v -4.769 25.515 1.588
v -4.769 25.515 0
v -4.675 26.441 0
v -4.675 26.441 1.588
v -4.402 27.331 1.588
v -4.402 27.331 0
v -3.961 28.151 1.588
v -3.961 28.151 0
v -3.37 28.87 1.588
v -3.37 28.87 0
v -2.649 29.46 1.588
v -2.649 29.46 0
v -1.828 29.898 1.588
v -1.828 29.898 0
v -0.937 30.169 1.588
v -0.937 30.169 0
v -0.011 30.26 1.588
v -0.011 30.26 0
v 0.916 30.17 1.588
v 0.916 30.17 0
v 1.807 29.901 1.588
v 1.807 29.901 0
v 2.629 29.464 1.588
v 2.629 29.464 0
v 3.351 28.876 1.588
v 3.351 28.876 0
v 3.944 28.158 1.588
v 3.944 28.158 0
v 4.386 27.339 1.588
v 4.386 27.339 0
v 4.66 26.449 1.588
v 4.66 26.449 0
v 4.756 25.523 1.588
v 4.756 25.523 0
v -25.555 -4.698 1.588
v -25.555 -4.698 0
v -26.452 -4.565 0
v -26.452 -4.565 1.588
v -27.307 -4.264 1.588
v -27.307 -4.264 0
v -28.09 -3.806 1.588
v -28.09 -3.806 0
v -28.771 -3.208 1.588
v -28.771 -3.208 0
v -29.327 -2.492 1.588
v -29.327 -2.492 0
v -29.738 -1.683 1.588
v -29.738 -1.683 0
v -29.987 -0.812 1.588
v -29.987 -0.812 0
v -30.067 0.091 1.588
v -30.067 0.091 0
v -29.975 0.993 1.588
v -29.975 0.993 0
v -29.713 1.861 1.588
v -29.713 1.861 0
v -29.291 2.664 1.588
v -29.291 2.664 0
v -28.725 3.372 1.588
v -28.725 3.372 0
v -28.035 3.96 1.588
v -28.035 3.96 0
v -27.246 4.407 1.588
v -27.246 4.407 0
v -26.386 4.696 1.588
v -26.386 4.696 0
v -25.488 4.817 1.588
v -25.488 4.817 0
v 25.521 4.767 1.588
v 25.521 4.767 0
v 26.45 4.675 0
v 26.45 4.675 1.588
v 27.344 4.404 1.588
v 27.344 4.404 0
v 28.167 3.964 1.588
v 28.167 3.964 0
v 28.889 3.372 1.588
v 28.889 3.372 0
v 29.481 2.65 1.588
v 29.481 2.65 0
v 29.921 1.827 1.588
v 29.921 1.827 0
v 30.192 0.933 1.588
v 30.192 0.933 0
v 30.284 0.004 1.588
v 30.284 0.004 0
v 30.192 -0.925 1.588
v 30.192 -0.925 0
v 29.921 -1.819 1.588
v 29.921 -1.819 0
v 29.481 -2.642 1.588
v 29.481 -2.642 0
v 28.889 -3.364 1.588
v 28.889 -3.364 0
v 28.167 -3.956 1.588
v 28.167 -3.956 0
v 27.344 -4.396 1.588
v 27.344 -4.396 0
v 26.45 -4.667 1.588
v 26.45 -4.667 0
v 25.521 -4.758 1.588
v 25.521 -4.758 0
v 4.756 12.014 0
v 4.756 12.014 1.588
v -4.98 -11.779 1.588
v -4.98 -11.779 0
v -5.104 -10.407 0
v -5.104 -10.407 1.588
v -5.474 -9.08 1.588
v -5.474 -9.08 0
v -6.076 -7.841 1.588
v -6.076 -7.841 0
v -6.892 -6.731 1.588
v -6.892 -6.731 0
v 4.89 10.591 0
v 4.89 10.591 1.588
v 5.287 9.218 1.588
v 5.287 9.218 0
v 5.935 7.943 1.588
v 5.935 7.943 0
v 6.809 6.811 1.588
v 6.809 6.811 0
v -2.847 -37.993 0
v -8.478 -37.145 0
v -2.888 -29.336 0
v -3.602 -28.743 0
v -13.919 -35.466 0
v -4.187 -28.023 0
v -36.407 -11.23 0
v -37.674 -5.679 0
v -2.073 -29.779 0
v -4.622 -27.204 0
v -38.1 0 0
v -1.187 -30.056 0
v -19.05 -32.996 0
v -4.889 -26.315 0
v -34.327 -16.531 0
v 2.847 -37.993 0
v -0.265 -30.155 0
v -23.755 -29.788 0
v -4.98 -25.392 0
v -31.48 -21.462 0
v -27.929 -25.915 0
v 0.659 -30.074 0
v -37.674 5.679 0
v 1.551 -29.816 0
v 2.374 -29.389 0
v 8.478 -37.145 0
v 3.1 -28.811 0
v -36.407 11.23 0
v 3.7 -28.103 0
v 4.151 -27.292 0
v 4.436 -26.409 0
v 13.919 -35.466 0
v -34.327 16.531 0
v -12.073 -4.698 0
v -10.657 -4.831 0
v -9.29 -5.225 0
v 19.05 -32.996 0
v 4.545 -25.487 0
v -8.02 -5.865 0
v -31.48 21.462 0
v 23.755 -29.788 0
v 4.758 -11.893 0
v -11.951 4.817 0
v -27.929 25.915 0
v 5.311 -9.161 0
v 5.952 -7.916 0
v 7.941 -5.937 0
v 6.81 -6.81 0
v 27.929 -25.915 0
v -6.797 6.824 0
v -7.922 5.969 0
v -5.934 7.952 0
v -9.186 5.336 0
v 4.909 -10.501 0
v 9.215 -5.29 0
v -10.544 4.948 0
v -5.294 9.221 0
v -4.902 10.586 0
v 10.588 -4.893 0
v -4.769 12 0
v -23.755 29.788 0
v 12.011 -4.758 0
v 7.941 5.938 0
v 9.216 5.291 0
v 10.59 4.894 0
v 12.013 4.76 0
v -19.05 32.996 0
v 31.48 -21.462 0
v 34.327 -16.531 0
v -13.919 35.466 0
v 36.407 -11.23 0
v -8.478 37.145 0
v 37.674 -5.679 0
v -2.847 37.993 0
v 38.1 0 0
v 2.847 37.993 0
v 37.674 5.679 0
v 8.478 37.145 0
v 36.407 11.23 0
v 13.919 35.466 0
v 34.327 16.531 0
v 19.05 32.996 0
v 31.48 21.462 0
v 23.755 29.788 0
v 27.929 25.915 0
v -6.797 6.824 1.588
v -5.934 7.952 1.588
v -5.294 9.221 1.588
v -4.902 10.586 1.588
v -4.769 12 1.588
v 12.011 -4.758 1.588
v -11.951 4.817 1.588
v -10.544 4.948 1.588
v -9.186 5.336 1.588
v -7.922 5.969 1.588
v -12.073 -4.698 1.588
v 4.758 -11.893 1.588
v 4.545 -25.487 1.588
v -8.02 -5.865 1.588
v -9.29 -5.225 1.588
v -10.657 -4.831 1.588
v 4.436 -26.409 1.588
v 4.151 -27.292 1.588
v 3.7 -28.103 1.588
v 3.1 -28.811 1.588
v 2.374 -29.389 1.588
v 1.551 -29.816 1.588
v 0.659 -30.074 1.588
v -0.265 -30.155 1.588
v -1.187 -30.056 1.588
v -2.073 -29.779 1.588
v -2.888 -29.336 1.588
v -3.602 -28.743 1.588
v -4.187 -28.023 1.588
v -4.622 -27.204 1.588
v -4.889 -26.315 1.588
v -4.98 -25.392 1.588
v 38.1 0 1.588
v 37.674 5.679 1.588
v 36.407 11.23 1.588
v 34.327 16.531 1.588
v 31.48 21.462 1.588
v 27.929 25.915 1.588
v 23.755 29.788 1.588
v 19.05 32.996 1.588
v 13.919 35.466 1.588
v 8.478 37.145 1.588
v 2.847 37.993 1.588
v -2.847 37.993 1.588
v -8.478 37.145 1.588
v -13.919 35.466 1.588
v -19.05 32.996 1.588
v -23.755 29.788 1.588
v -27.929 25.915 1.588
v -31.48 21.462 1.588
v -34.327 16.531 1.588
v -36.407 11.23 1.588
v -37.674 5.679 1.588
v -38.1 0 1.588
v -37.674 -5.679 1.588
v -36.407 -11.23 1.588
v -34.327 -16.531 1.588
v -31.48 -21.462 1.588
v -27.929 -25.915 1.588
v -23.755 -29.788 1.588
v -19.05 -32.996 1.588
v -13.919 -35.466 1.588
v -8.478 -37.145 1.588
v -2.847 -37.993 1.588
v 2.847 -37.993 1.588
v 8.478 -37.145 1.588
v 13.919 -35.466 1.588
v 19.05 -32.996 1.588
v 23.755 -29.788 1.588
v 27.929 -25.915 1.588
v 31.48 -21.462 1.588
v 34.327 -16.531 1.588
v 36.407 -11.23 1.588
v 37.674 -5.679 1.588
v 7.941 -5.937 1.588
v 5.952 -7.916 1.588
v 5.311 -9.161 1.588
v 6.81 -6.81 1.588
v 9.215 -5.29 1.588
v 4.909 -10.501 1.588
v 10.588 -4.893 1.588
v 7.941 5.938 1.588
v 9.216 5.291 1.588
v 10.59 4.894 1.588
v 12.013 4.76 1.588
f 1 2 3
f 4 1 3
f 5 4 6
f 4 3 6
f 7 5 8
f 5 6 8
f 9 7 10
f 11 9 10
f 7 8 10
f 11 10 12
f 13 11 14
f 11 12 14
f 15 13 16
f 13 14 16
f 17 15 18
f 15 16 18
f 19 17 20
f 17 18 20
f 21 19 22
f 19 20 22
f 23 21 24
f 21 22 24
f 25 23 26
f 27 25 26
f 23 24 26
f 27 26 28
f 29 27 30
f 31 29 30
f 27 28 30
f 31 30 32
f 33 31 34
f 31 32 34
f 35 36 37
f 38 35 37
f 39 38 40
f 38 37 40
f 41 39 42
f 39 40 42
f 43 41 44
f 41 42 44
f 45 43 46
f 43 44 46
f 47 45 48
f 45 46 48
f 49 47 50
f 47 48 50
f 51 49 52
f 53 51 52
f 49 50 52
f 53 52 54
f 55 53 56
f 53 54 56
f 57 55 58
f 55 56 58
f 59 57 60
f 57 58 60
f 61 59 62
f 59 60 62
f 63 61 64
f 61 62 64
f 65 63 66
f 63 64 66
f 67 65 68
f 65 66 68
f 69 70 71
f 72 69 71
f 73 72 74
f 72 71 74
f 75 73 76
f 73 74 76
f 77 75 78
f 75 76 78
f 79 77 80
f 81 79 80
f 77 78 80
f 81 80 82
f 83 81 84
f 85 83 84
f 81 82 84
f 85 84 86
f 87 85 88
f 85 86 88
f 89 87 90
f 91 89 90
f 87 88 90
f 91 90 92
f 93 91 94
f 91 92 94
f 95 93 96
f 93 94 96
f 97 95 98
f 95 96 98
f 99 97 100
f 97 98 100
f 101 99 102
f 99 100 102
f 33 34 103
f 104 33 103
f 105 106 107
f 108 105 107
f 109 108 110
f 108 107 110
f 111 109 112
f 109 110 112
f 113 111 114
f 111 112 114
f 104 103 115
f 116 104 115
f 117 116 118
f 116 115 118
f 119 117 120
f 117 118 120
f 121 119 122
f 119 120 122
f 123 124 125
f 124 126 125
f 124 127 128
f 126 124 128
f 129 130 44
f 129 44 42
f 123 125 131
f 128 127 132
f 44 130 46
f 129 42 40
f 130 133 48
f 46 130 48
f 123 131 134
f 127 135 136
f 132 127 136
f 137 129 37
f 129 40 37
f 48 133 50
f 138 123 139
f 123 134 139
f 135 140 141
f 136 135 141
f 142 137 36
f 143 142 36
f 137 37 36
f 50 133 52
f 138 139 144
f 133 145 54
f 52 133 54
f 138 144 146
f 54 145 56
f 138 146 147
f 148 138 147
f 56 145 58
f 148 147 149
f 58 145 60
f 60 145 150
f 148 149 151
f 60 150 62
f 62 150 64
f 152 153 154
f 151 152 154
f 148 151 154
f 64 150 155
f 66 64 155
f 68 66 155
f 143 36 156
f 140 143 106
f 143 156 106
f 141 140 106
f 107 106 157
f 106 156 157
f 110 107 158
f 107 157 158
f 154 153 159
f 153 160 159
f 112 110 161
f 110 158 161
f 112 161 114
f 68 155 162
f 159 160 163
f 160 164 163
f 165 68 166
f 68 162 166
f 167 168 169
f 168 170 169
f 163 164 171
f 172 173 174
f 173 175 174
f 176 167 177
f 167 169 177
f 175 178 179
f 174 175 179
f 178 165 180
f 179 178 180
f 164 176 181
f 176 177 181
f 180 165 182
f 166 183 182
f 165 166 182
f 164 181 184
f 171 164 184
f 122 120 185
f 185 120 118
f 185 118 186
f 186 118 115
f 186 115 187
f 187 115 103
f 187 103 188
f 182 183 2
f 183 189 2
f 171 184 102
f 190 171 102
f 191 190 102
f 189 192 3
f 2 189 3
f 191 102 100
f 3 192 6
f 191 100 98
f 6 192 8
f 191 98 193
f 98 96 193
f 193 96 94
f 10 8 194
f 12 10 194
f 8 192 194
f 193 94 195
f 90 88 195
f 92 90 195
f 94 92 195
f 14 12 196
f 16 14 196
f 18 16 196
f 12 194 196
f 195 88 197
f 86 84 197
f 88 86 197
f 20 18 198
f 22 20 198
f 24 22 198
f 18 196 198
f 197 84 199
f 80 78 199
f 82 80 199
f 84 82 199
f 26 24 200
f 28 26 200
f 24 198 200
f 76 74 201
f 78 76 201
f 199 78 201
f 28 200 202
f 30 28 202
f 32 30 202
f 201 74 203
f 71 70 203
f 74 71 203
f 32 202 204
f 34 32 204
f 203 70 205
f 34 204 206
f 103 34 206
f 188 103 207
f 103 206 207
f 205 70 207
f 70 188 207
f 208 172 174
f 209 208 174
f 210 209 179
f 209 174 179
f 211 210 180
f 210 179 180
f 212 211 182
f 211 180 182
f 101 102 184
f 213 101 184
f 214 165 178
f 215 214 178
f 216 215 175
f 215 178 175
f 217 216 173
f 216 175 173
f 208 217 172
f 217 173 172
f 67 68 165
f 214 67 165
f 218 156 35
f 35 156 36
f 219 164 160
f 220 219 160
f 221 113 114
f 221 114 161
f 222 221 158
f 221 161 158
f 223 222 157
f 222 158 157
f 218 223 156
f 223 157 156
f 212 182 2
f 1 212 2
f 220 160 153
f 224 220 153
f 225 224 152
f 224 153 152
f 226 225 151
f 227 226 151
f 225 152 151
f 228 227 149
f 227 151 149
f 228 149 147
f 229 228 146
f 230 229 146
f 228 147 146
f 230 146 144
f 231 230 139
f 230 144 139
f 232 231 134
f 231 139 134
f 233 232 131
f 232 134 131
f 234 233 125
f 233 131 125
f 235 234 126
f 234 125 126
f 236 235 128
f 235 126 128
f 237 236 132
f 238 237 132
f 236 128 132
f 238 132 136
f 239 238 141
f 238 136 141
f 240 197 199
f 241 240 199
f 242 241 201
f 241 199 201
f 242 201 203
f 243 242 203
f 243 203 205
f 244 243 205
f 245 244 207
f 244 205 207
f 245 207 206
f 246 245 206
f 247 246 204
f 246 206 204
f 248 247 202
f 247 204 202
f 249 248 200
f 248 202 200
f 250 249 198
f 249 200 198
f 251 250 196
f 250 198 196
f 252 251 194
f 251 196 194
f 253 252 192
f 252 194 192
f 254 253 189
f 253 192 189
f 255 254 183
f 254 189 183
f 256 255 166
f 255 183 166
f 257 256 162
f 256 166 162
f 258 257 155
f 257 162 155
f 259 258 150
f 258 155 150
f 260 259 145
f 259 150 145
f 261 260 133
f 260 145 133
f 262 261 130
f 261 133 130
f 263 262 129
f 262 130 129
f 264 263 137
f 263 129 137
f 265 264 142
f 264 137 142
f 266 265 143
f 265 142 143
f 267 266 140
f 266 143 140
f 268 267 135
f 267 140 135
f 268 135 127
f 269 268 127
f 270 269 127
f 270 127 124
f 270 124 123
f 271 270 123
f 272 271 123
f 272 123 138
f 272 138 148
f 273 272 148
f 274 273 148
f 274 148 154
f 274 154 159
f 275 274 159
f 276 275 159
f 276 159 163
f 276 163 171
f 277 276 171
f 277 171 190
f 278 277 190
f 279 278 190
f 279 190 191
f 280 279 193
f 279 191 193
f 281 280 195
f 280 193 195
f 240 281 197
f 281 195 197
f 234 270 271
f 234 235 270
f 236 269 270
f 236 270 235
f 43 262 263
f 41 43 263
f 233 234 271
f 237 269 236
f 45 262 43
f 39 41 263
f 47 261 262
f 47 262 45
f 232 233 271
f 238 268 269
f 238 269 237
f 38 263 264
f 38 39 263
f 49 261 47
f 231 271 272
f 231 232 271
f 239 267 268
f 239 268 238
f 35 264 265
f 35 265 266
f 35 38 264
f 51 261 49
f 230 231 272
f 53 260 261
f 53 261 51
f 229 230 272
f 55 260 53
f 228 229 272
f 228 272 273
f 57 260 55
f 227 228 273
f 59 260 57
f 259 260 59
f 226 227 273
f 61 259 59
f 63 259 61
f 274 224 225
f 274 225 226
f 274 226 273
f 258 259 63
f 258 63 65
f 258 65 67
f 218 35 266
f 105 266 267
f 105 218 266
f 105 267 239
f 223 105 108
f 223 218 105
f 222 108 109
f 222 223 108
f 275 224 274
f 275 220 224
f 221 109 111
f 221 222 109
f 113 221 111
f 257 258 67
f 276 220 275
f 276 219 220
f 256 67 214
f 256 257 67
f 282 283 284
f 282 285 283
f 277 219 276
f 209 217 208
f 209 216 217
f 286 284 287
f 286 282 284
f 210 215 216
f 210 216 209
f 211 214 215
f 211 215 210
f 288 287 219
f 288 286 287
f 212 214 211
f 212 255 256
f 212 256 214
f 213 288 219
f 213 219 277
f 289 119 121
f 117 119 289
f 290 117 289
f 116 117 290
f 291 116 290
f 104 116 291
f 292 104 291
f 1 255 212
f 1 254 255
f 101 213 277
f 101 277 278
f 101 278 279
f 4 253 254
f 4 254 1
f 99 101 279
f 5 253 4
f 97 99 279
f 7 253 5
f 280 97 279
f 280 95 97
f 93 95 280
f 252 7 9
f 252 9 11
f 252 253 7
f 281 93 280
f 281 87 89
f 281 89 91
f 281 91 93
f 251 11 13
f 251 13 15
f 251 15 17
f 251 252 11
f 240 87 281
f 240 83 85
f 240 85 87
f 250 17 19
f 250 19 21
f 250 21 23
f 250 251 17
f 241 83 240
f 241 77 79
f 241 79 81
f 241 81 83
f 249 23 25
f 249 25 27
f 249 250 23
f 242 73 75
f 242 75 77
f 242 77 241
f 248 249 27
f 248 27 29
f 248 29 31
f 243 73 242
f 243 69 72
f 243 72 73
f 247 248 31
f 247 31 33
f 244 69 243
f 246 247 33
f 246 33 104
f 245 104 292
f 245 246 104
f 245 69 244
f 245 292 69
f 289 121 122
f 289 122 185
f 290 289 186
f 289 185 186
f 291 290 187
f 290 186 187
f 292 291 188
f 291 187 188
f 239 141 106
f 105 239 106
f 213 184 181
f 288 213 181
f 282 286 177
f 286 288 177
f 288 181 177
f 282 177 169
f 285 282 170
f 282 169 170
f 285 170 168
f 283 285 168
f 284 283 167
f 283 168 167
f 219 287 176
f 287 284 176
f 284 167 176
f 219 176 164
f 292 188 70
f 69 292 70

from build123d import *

# Parameters (mm, degrees)
F0_R         = 38.1
F1_DEPTH     = 1.5875
F2_T1_DEPTH  = 19.6594045054
F2_T3_DEPTH  = 19.7689044348
F2_T5_DEPTH  = 19.8002867112
F2_T7_DEPTH  = 19.8028708993
F2_T9_DEPTH  = 19.7937834769
F2_T11_DEPTH = 19.3627357335
F2_T13_DEPTH = 19.2813787557
F2_T15_DEPTH = 19.9326468644


# Not quite as in the source:
# - a fillet or chamfer that OpenCascade refuses, or shapes differently, is made with other operations: its cross-section is extruded or revolved along the edge and cut away or added


with BuildPart() as f1:
    # F0 (on Top) → F1 (new body)
    with BuildSketch(Plane.XY):
        Circle(F0_R)
        with BuildLine():
            ThreePointArc((25.5212023113, 4.7665246553), (30.2837023113, 0.0040246553), (25.5212023113, -4.7584753447))
            Line((25.5212023113, -4.7584753447), (8.3700942824, -4.7584753447))
            ThreePointArc((8.3700942824, -4.7584753447), (6.8307613912, -6.7854450641), (4.8140826203, -8.3382356902))
            Line((4.8140826203, -8.3382356902), (4.5445678914, -25.4872259938))
            ThreePointArc((4.5445678914, -25.4872259938), (-0.2648058004, -30.1554173191), (-4.9795027497, -25.3916248979))
            Line((-4.9795027497, -25.3916248979), (-4.9795027497, -8.2405168689))
            ThreePointArc((-4.9795027497, -8.2405168689), (-6.9221674375, -6.692171835), (-8.4040103572, -4.6983162748))
            Line((-8.4040103572, -4.6983162748), (-25.5551183861, -4.6983162748))
            ThreePointArc((-25.5551183861, -4.6983162748), (-30.0672979191, 0.0912532901), (-25.4878952685, 4.8165905393))
            Line((-25.4878952685, 4.8165905393), (-8.3367872396, 4.8165905393))
            ThreePointArc((-8.3367872396, 4.8165905393), (-6.7888119889, 6.8274151536), (-4.7692424862, 8.3639638934))
            Line((-4.7692424862, 8.3639638934), (-4.7692424862, 25.5150719223))
            ThreePointArc((-4.7692424862, 25.5150719223), (-0.0106390137, 30.260270074), (4.7556603142, 25.5228020557))
            Line((4.7556603142, 25.5228020557), (4.7556603142, 8.3716940268))
            ThreePointArc((4.7556603142, 8.3716940268), (6.8069974407, 6.8092842314), (8.3700961728, 4.7584720195))
            Line((8.3700961728, 4.7584720195), (25.5212023113, 4.7665246553))
        make_face(mode=Mode.SUBTRACT)
    extrude(amount=F1_DEPTH)

    # F2: fillet of radius 7.62 on 8 edges, made by hand

    # F2_s2 → F2_t1 (cut)
    with BuildSketch(Plane.XY.offset(-9.0359522527)):
        with BuildLine():
            ThreePointArc((-11.9511681406, 4.8165905393), (-9.1053172731, 5.3679603439), (-6.6713079375, 6.9422774581))
            ThreePointArc((-6.6713079375, 6.9422774581), (-7.5789423028, 5.9381141343), (-8.3367872396, 4.8165905393))
            Line((-8.3367872396, 4.8165905393), (-11.9511681406, 4.8165905393))
        make_face()
    extrude(amount=F2_T1_DEPTH, mode=Mode.SUBTRACT)

    # F2_s4 → F2_t3 (cut)
    with BuildSketch(Plane.XY.offset(-9.0907022174)):
        with BuildLine():
            ThreePointArc((-6.9158471176, 6.6987031989), (-5.3262518764, 9.1404259669), (-4.7692424862, 12.0002447803))
            Line((-4.7692424862, 12.0002447803), (-4.7692424862, 8.3639638934))
            ThreePointArc((-4.7692424862, 8.3639638934), (-5.9015763197, 7.607428136), (-6.9158471176, 6.6987031989))
        make_face()
    extrude(amount=F2_T3_DEPTH, mode=Mode.SUBTRACT)

    # F2_s6 → F2_t5 (cut)
    with BuildSketch(Plane.XY.offset(-9.1063933556)):
        with BuildLine():
            ThreePointArc((4.7556603142, 12.014251369), (5.3142882964, 9.1504383117), (6.9082653607, 6.7065218711))
            ThreePointArc((6.9082653607, 6.7065218711), (5.8910941356, 7.615548292), (4.7556603142, 8.3716940268))
            Line((4.7556603142, 8.3716940268), (4.7556603142, 12.014251369))
        make_face()
    extrude(amount=F2_T5_DEPTH, mode=Mode.SUBTRACT)

    # F2_s8 → F2_t7 (cut)
    with BuildSketch(Plane.XY.offset(-9.1076854497)):
        with BuildLine():
            ThreePointArc((6.703921101, 6.9107892294), (9.1487661341, 5.3175989867), (12.0131699511, 4.7601824833))
            Line((12.0131699511, 4.7601824833), (8.3700961728, 4.7584720195))
            ThreePointArc((8.3700961728, 4.7584720195), (7.6134497132, 5.893806017), (6.703921101, 6.9107892294))
        make_face()
    extrude(amount=F2_T7_DEPTH, mode=Mode.SUBTRACT)

    # F2_s10 → F2_t9 (cut)
    with BuildSketch(Plane.XY.offset(-9.1031417385)):
        with BuildLine():
            ThreePointArc((12.0113509777, -4.7584753447), (9.1483653066, -5.3167678283), (6.7049028325, -6.9098367498))
            ThreePointArc((6.7049028325, -6.9098367498), (7.6138671828, -5.8932667023), (8.3700942824, -4.7584753447))
            Line((8.3700942824, -4.7584753447), (12.0113509777, -4.7584753447))
        make_face()
    extrude(amount=F2_T9_DEPTH, mode=Mode.SUBTRACT)

    # F2_s12 → F2_t11 (cut)
    with BuildSketch(Plane.XY.offset(-8.8876178667)):
        with BuildLine():
            ThreePointArc((6.90916797, -6.7055919846), (5.3384286521, -9.0938512154), (4.7582181499, -11.8928438791))
            Line((4.7582181499, -11.8928438791), (4.8140826203, -8.3382356902))
            ThreePointArc((4.8140826203, -8.3382356902), (5.9181950346, -7.5945067933), (6.90916797, -6.7055919846))
        make_face()
    extrude(amount=F2_T11_DEPTH, mode=Mode.SUBTRACT)

    # F2_s14 → F2_t13 (cut)
    with BuildSketch(Plane.XY.offset(-8.8469393778)):
        with BuildLine():
            ThreePointArc((-4.9795027497, -11.7792926201), (-5.5115025024, -8.9820345887), (-7.0332173151, -6.5753646363))
            ThreePointArc((-7.0332173151, -6.5753646363), (-6.06378956, -7.478771428), (-4.9795027497, -8.2405168689))
            Line((-4.9795027497, -8.2405168689), (-4.9795027497, -11.7792926201))
        make_face()
    extrude(amount=F2_T13_DEPTH, mode=Mode.SUBTRACT)

    # F2_s16 → F2_t15 (cut)
    with BuildSketch(Plane.XY.offset(-9.1725734322)):
        with BuildLine():
            ThreePointArc((-6.7393383503, -6.8762551219), (-9.1924239959, -5.2637820597), (-12.0730397301, -4.6983162748))
            Line((-12.0730397301, -4.6983162748), (-8.4040103572, -4.6983162748))
            ThreePointArc((-8.4040103572, -4.6983162748), (-7.6495821405, -5.8468332435), (-6.7393383503, -6.8762551219))
        make_face()
    extrude(amount=F2_T15_DEPTH, mode=Mode.SUBTRACT)


solid = f1.part
